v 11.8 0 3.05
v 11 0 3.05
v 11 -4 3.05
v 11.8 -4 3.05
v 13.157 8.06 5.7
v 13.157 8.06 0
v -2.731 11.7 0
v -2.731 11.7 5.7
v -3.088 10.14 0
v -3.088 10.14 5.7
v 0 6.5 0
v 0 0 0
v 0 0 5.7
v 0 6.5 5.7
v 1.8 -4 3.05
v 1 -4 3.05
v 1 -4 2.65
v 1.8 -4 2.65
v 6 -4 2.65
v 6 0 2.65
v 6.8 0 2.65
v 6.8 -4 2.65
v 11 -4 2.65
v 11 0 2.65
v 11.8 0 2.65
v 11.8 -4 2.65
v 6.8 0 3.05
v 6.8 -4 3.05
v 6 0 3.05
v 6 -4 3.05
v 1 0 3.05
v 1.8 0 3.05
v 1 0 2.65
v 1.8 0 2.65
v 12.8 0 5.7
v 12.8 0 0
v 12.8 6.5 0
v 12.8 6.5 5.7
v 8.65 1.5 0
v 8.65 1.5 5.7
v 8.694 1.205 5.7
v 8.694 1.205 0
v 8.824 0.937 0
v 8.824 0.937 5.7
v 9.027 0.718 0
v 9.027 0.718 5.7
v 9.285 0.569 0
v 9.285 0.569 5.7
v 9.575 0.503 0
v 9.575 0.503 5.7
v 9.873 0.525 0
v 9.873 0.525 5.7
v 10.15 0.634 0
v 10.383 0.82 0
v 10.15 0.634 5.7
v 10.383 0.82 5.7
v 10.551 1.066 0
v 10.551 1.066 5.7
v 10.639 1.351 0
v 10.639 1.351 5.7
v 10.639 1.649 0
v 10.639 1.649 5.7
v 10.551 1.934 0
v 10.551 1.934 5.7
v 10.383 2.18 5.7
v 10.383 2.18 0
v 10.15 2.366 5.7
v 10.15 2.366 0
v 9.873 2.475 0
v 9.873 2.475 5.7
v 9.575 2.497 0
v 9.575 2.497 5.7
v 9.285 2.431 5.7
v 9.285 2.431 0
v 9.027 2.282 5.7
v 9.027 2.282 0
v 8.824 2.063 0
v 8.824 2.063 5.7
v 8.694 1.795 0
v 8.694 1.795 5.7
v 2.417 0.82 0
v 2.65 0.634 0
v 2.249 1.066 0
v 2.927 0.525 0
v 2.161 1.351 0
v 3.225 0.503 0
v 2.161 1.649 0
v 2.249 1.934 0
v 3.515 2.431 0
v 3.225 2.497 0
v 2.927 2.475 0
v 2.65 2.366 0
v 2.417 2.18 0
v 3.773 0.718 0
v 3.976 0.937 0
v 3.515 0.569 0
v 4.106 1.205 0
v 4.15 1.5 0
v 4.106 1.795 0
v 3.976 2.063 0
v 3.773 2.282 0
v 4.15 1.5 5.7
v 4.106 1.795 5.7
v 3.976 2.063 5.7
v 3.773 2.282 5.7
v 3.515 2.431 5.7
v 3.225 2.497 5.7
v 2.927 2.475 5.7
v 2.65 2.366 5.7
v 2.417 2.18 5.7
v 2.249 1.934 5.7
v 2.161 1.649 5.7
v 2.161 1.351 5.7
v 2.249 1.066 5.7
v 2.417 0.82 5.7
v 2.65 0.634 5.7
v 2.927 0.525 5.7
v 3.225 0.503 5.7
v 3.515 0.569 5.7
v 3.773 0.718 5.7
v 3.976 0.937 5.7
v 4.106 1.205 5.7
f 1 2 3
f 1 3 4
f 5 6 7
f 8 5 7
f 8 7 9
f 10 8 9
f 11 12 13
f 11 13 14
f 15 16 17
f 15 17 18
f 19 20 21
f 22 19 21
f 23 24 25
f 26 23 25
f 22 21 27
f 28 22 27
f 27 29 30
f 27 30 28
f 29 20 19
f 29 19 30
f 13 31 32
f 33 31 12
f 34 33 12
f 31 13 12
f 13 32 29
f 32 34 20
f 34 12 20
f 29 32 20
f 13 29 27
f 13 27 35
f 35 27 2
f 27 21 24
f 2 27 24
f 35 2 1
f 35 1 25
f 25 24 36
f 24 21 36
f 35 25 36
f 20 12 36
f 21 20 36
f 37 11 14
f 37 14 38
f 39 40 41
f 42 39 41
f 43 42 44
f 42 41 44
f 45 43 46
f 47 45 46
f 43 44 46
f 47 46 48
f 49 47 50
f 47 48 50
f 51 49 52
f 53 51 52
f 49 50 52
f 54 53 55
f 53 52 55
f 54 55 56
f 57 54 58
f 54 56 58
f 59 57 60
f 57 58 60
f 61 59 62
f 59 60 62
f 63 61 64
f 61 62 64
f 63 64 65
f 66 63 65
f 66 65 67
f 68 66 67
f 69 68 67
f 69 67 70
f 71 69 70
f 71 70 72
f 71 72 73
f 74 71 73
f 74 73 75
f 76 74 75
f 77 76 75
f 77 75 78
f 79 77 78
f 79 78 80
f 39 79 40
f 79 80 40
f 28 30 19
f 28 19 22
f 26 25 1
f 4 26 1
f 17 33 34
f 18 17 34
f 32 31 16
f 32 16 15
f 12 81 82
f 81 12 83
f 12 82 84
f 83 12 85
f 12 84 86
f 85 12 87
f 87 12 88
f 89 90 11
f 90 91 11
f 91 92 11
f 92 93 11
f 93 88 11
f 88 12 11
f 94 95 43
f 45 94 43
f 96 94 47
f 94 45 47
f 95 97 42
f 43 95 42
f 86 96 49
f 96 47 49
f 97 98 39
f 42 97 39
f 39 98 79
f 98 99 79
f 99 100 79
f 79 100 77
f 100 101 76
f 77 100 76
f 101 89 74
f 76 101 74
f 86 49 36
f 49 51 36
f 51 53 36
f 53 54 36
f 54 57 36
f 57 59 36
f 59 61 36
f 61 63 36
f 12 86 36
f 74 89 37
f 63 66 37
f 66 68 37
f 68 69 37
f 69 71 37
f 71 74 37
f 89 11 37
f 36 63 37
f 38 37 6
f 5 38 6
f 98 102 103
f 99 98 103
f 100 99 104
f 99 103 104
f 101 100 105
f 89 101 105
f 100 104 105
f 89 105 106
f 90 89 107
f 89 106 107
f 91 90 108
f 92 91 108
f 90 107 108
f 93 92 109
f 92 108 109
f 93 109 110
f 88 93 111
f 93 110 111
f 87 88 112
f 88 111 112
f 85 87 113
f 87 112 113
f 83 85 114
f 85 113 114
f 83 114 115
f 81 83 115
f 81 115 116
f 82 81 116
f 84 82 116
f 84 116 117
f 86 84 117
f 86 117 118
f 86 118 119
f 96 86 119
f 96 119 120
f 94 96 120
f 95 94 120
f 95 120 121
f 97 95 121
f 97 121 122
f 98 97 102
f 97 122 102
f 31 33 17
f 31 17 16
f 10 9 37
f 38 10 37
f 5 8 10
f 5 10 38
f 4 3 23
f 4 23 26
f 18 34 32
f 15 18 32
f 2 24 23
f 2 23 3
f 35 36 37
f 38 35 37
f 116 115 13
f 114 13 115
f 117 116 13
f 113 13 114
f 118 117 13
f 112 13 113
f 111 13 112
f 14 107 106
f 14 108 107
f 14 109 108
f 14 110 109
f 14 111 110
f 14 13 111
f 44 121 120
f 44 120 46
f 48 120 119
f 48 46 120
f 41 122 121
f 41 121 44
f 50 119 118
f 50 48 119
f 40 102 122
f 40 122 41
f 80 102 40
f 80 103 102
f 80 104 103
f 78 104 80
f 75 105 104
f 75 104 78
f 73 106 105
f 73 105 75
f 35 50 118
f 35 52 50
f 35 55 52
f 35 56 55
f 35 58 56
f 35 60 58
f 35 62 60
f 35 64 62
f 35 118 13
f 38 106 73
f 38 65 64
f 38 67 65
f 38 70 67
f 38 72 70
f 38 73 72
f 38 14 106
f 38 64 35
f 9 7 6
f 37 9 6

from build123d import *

# Parameters (mm, degrees)
ESQUISSE1_W             = 12.8
ESQUISSE1_H             = 6.5
BOSS_EXTRU_1_DEPTH      = 5.7
BOSS_EXTRU_1_2_DEPTH    = 5.7
ESQUISSE2_R             = 1
ENL_V_MAT_EXTRU_1_DEPTH = 5.7
ESQUISSE3_W             = 0.8
ESQUISSE3_H             = 0.4
BOSS_EXTRU_2_DEPTH      = 4


with BuildPart() as part:
    # Esquisse1 → Boss.-Extru.1 (new body)
    with BuildSketch(Plane.XY):
        with Locations((6.4, 3.25)):
            Rectangle(ESQUISSE1_W, ESQUISSE1_H)
    extrude(amount=BOSS_EXTRU_1_DEPTH)

    # Esquisse2 → Enlèv. mat.-Extru.1 (cut)
    with BuildSketch(Plane.XY.offset(5.7)):
        with Locations((3.15, 1.5)):
            Circle(ESQUISSE2_R)
        with Locations((9.65, 1.5)):
            Circle(ESQUISSE2_R)
    extrude(amount=-ENL_V_MAT_EXTRU_1_DEPTH, mode=Mode.SUBTRACT)

    # Esquisse3 → Boss.-Extru.2 (add)
    with BuildSketch(Plane.XZ):
        with Locations((6.4, 2.85)):
            Rectangle(ESQUISSE3_W, ESQUISSE3_H)
        with Locations((1.4, 2.85)):
            Rectangle(ESQUISSE3_W, ESQUISSE3_H)
        with Locations((11.4, 2.85)):
            Rectangle(ESQUISSE3_W, ESQUISSE3_H)
    extrude(amount=BOSS_EXTRU_2_DEPTH)


with BuildPart() as body_2:
    # Esquisse1 → Boss.-Extru.1 2 (new body)
    with BuildSketch(Plane.XY):
        Polygon((-3.08827816, 10.140414414), (12.8, 6.5), (13.157341292, 8.059585586), (-2.730936868, 11.7), align=None)
    extrude(amount=BOSS_EXTRU_1_2_DEPTH)


solid = Compound([part.part, body_2.part])
